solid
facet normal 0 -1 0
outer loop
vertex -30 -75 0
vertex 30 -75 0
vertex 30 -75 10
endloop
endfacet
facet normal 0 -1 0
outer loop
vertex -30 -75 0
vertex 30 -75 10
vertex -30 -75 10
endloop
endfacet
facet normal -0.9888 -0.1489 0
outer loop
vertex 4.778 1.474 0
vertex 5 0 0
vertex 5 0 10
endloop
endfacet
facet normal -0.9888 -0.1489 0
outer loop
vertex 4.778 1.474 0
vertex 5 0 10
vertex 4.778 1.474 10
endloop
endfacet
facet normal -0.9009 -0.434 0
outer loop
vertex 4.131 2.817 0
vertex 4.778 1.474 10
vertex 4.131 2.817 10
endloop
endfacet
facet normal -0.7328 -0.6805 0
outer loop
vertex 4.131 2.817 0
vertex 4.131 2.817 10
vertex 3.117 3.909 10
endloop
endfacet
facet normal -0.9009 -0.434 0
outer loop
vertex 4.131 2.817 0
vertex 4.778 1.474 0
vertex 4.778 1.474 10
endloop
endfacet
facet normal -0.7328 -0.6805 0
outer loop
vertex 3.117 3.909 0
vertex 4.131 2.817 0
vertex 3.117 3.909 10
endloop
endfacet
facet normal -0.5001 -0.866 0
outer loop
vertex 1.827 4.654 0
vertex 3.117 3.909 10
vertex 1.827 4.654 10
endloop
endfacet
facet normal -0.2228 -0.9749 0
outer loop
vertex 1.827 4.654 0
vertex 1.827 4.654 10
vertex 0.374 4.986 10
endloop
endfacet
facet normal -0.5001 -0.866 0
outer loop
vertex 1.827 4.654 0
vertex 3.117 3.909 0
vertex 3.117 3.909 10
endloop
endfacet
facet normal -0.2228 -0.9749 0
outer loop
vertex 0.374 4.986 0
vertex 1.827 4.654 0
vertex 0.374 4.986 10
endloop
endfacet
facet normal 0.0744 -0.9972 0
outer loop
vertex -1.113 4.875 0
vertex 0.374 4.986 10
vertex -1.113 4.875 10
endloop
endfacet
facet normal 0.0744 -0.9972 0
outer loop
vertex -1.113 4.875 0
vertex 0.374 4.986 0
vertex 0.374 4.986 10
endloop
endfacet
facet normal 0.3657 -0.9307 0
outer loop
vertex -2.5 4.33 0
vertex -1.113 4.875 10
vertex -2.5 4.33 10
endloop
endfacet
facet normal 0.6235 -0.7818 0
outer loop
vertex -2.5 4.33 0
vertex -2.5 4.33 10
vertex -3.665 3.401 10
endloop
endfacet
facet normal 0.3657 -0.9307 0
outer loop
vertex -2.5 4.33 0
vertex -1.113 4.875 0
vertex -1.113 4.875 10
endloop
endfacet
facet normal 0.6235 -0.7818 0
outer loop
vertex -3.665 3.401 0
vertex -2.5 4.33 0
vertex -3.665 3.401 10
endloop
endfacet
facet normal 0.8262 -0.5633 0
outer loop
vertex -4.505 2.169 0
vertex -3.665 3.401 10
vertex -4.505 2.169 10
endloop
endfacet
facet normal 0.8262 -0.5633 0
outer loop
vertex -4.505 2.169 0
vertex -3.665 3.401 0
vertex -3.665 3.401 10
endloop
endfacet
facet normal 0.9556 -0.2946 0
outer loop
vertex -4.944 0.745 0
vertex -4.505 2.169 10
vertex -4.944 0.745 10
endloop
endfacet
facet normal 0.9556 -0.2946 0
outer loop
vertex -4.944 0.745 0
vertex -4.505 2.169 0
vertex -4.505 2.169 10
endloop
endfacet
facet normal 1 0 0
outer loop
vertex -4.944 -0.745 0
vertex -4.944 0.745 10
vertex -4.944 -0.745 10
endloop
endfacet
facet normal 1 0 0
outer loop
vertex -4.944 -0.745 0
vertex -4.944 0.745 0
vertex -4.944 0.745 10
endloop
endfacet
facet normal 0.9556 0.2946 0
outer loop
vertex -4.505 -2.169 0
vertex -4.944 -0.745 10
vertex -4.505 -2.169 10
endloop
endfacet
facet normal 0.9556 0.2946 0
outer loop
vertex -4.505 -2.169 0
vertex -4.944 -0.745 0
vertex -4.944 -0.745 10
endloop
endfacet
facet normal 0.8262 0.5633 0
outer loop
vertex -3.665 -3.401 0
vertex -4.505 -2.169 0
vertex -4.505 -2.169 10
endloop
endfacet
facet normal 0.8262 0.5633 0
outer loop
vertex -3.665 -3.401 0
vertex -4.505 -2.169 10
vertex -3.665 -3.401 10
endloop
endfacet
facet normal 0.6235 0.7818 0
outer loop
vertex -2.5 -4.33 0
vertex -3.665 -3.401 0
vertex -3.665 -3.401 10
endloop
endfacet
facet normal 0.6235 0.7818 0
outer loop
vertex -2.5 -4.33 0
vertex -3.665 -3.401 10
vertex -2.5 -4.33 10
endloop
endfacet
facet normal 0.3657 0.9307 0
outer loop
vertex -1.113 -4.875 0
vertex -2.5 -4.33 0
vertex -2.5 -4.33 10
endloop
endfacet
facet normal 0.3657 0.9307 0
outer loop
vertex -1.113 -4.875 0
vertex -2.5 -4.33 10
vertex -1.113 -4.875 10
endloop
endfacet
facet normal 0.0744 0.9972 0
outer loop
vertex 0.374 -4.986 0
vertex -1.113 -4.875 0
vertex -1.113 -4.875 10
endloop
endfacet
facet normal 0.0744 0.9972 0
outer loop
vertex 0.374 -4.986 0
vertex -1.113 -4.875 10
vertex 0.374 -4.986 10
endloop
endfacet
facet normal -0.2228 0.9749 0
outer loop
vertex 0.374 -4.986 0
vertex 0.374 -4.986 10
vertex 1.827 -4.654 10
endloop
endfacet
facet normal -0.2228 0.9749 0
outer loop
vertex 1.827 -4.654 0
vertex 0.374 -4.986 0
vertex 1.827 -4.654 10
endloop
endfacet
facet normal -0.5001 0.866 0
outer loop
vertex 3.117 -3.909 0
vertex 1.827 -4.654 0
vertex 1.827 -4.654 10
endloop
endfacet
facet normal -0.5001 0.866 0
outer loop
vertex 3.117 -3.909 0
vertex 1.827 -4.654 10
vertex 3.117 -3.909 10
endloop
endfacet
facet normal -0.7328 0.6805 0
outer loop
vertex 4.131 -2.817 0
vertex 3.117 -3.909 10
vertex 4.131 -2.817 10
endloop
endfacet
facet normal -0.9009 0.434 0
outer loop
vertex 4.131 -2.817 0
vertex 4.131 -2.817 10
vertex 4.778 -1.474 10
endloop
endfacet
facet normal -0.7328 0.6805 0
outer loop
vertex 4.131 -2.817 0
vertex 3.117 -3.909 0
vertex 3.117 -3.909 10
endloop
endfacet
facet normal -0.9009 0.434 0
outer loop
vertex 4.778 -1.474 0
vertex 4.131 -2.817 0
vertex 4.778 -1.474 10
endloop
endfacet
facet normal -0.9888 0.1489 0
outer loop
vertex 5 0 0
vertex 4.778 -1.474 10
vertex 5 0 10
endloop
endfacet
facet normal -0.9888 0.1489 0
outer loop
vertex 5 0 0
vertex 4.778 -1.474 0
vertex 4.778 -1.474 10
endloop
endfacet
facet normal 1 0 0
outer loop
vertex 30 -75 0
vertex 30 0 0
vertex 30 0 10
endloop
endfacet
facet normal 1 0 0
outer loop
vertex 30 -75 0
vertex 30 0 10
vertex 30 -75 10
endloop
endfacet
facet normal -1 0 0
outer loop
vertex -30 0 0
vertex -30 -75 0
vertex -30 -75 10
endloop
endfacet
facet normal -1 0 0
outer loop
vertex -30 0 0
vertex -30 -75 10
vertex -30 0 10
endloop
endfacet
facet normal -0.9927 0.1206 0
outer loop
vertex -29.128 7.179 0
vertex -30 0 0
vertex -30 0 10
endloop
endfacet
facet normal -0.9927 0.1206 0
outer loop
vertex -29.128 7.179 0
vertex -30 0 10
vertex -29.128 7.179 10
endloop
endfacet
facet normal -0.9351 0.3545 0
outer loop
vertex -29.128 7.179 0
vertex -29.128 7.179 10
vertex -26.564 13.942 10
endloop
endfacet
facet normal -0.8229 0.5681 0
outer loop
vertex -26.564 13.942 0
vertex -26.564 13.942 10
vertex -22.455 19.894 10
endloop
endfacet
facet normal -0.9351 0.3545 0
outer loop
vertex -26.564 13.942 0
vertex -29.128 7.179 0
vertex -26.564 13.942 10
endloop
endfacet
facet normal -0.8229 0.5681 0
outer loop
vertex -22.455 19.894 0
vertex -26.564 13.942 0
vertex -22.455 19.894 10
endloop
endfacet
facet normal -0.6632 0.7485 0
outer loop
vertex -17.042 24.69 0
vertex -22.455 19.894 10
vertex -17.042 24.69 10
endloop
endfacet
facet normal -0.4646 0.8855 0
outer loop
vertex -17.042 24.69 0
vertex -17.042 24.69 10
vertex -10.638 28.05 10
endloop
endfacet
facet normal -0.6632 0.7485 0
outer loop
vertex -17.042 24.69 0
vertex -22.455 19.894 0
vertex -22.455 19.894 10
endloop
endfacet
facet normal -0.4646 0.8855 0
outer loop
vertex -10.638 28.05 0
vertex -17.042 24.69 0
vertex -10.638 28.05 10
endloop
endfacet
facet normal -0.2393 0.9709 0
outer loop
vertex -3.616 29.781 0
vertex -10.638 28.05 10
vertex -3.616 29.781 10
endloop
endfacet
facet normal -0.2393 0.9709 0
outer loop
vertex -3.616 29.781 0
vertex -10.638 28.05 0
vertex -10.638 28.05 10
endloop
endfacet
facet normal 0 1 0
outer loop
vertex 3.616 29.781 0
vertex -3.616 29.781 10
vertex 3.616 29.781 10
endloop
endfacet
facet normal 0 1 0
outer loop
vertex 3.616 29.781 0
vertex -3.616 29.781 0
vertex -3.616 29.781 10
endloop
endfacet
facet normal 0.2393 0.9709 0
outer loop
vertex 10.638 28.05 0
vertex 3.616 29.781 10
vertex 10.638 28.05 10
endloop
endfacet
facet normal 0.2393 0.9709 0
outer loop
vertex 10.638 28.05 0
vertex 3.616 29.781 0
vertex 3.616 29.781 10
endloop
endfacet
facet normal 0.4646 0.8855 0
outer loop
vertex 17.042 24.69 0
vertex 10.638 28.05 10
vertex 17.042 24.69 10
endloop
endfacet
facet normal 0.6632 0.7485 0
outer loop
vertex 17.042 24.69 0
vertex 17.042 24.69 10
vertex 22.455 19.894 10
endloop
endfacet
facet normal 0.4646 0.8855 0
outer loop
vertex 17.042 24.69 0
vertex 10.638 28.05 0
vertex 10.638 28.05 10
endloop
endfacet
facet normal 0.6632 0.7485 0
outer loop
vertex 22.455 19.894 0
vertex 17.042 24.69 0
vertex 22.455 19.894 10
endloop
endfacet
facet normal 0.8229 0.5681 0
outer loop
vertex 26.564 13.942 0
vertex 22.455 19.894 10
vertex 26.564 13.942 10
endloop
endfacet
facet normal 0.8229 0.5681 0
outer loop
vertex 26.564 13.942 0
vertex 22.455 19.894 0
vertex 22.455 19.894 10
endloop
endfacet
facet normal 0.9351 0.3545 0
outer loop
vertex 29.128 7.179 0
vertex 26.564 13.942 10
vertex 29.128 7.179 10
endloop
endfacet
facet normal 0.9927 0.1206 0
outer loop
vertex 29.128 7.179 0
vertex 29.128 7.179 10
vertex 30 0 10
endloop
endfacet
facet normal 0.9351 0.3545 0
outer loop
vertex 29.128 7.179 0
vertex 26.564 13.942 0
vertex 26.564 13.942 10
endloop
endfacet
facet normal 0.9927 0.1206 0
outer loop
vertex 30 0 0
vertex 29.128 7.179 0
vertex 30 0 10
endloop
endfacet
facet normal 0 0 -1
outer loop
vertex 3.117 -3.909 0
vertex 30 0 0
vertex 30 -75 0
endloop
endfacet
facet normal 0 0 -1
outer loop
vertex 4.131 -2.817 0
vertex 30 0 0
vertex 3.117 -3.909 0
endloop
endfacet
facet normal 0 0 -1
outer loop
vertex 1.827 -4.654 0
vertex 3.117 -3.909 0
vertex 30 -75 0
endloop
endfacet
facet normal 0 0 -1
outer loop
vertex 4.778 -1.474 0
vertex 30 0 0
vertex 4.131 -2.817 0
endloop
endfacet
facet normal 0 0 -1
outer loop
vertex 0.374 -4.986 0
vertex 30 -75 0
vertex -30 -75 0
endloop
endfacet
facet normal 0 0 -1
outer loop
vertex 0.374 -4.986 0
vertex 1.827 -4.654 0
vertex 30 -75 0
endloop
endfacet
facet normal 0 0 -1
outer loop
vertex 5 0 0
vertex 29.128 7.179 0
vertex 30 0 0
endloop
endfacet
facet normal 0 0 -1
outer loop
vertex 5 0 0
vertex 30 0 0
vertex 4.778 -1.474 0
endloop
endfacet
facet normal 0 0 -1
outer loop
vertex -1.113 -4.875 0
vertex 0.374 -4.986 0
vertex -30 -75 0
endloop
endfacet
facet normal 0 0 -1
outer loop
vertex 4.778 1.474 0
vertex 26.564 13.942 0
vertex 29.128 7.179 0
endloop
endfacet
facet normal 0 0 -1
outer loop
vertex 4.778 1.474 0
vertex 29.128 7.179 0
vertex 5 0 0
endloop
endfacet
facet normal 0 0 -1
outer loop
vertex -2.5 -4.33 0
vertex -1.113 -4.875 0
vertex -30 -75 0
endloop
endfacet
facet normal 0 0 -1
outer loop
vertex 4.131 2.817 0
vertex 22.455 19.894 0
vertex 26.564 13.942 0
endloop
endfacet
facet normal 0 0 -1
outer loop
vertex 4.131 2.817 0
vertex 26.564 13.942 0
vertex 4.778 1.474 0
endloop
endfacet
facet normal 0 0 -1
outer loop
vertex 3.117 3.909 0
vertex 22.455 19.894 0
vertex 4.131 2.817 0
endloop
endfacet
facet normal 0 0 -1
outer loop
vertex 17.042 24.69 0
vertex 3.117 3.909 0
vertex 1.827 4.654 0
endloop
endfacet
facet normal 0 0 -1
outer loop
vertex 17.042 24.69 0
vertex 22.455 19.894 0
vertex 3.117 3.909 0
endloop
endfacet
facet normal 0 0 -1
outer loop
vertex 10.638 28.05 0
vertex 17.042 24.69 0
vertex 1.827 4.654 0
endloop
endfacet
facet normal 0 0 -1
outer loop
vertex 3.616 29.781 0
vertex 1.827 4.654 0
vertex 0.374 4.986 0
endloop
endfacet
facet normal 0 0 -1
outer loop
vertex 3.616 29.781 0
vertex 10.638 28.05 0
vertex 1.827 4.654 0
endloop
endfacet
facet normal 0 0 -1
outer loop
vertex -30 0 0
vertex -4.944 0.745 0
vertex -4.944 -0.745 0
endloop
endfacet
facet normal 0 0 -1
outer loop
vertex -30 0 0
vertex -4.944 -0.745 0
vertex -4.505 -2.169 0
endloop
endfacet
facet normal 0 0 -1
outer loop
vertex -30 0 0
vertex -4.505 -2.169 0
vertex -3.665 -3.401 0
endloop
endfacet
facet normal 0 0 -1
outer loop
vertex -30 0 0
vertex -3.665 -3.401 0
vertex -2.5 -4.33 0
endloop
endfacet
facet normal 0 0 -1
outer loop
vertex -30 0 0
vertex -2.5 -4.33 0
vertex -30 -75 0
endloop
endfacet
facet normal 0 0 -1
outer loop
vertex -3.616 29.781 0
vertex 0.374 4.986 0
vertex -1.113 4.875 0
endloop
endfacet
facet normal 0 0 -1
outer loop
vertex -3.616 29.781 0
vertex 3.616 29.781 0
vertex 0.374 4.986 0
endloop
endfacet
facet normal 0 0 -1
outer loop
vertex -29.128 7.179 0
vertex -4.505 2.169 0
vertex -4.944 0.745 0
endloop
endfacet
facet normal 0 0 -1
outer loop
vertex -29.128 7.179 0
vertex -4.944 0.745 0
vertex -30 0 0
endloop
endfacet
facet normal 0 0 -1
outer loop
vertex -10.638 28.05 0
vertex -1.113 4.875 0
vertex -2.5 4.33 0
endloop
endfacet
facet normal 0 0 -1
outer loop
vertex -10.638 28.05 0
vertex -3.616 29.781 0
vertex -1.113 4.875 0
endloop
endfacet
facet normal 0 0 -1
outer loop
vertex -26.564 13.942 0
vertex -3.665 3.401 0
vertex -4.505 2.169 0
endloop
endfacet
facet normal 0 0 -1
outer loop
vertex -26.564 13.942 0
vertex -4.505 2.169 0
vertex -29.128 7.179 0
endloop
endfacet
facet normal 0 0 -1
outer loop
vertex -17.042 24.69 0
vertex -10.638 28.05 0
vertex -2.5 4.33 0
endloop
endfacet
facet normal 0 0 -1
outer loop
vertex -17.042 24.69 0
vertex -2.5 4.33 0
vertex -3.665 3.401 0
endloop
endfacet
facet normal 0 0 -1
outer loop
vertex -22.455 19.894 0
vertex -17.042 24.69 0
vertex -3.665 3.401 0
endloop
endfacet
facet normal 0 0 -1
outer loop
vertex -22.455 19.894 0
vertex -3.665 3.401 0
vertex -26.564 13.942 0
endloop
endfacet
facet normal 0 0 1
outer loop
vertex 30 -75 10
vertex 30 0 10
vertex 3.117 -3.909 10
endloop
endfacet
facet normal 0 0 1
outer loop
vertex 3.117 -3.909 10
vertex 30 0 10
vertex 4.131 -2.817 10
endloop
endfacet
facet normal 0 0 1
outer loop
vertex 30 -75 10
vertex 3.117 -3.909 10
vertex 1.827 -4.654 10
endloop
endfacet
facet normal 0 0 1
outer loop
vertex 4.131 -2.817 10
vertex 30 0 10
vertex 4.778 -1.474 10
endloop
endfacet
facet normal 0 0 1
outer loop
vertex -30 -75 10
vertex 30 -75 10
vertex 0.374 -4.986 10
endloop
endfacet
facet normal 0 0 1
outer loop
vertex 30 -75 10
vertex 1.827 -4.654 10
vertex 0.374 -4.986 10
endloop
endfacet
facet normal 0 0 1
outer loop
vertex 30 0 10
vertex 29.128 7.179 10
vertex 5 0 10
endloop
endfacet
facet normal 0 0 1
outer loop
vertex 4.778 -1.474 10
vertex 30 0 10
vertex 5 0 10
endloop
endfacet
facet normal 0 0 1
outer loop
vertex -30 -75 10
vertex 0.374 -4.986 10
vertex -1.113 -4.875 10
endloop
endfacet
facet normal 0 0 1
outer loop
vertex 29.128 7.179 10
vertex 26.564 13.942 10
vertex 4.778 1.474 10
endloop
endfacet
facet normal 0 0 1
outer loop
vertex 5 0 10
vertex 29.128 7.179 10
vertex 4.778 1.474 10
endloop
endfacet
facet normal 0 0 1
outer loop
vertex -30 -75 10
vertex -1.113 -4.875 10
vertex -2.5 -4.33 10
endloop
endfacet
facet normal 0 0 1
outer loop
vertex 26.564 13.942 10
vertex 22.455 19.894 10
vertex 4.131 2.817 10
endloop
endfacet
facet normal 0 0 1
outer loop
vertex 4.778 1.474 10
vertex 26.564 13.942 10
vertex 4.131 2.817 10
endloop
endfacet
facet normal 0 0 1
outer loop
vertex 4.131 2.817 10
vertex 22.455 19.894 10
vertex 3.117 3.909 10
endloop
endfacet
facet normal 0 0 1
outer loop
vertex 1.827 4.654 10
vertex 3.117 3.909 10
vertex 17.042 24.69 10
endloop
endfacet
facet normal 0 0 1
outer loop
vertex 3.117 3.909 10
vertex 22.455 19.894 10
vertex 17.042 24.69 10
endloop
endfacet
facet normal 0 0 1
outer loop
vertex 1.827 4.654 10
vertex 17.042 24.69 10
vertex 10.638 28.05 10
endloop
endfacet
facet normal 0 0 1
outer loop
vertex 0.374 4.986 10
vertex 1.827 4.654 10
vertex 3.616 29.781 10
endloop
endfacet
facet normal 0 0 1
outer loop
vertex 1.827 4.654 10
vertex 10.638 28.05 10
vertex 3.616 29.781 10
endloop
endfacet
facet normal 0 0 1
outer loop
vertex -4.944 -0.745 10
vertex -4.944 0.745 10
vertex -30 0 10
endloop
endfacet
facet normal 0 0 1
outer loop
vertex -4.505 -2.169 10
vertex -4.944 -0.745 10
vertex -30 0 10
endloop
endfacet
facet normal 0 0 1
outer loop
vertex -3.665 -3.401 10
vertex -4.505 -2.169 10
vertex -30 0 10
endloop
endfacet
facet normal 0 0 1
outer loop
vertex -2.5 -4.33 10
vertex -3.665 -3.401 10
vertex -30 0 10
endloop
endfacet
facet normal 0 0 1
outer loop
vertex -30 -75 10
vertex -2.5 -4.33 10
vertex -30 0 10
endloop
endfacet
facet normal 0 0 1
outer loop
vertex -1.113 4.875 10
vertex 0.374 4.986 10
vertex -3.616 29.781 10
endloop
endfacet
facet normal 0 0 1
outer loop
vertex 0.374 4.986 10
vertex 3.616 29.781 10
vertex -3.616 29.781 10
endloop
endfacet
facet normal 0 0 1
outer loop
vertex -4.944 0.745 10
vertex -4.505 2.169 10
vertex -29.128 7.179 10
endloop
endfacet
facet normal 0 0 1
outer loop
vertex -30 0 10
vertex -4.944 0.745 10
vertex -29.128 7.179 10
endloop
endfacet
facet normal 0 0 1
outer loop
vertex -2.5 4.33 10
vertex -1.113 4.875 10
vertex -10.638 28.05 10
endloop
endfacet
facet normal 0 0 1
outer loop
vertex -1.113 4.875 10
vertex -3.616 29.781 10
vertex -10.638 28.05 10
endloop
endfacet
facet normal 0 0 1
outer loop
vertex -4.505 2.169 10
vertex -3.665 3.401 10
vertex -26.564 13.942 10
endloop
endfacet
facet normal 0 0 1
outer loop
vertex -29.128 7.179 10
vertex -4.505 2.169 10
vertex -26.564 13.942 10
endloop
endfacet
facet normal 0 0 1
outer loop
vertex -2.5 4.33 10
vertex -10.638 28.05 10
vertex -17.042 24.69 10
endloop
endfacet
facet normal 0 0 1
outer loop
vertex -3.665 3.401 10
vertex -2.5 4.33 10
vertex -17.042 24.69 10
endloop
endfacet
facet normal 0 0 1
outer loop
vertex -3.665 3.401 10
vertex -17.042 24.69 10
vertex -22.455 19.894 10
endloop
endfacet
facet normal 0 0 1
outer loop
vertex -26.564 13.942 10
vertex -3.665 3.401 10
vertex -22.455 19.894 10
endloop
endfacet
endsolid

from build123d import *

# Parameters (mm, degrees)
CROQUIS1_R              = 5
SALIENTE_EXTRUIR1_DEPTH = 10


with BuildPart() as part:
    # Croquis1 → Saliente-Extruir1 (new body)
    with BuildSketch(Plane.XY):
        with BuildLine():
            Line((9.5, -75), (-30, -75))
            Line((-30, -75), (-30, 0))
            ThreePointArc((-30, 0), (0, 30), (30, 0))
            Line((30, 0), (30, -75))
            Line((30, -75), (9.5, -75))
        make_face()
        Circle(CROQUIS1_R, mode=Mode.SUBTRACT)
    extrude(amount=SALIENTE_EXTRUIR1_DEPTH)


solid = part.part
